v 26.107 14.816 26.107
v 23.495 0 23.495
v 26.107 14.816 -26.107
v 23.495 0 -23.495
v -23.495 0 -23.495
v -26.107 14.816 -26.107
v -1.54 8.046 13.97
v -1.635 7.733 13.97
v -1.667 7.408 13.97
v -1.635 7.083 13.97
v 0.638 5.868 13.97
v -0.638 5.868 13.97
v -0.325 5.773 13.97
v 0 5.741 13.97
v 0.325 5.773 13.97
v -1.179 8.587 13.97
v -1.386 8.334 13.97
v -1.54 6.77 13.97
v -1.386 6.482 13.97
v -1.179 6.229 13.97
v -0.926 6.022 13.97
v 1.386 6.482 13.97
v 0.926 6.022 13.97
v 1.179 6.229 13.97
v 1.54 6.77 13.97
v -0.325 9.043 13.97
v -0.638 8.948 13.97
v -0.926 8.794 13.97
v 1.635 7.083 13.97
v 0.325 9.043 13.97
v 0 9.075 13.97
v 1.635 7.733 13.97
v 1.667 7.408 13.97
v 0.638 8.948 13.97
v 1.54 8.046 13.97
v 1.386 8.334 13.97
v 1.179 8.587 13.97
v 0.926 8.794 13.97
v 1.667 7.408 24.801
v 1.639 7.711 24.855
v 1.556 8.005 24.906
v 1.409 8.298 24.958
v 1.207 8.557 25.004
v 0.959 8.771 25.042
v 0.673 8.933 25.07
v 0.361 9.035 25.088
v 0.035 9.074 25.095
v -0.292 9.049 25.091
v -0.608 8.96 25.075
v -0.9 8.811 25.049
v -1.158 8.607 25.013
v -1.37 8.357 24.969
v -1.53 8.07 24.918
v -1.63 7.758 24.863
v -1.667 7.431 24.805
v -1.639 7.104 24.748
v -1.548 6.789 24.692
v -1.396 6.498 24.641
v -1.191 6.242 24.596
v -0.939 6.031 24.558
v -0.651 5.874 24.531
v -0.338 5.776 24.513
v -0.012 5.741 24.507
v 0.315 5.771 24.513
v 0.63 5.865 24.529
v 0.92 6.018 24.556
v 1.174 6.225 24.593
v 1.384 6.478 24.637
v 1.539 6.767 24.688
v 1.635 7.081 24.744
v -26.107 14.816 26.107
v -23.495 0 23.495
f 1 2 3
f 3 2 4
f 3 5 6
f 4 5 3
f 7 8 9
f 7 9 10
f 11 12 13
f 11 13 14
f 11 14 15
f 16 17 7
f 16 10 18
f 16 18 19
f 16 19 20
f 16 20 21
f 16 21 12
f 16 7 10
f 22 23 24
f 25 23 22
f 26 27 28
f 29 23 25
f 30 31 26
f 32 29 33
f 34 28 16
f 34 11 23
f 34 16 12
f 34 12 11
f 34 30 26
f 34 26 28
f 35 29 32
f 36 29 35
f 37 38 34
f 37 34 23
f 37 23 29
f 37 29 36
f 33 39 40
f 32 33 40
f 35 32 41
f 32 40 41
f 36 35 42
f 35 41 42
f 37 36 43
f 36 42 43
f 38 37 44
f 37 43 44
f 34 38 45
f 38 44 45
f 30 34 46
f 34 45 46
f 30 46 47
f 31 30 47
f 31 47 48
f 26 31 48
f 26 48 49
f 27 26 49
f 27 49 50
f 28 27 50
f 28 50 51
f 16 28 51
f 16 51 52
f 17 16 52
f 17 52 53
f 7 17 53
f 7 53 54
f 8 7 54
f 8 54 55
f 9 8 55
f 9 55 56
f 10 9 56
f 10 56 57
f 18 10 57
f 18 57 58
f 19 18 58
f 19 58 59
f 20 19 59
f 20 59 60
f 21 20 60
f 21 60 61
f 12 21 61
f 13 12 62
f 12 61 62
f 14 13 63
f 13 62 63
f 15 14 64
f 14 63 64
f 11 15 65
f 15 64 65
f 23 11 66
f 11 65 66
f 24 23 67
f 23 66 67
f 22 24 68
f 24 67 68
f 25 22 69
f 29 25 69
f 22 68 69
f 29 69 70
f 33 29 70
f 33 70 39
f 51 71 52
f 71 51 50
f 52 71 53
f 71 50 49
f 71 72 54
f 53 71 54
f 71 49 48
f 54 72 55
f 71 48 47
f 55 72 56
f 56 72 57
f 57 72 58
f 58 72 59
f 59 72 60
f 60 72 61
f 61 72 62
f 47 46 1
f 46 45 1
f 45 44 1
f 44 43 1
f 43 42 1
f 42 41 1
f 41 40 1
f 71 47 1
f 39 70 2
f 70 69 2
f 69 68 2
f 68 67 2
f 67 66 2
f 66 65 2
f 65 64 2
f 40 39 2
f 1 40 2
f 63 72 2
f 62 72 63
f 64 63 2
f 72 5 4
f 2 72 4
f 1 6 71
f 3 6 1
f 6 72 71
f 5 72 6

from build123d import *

# Parameters (mm, degrees)
ESQUISSE1_W             = 46.99
ESQUISSE1_H             = 46.99
BOSS_EXTRU_1_DEPTH      = 14.81582
BOSS_EXTRU_1_DRAFT      = -10
ESQUISSE4_R             = 1.666875
ENL_V_MAT_EXTRU_1_DEPTH = 12.7


with BuildPart() as part:
    # Esquisse1 → Boss.-Extru.1 (with draft: the straight prism first)
    with BuildSketch(Plane(origin=(0, 0, 0), x_dir=(1, 0, 0), z_dir=(0, 1, 0))):
        Rectangle(ESQUISSE1_W, ESQUISSE1_H)
    extrude(amount=BOSS_EXTRU_1_DEPTH)
    # Boss.-Extru.1: the draft: its side faces are tilted about the plane it starts from
    boss_extru_1_sides = [part.faces().sort_by_distance(p)[0] for p in [
        (0, 7.40791, 23.495),
        (23.495, 7.40791, 0),
        (0, 7.40791, -23.495),
        (-23.495, 7.40791, 0),
    ]]
    draft(boss_extru_1_sides, Plane(origin=(0, 0, 0), x_dir=(1, 0, 0), z_dir=(0, 1, 0)), BOSS_EXTRU_1_DRAFT)

    # Esquisse4 → Enlèv. mat.-Extru.1 (cut)
    with BuildSketch(Plane.XY.offset(26.67)):
        with Locations((0, 7.40791)):
            Circle(ESQUISSE4_R)
    extrude(amount=-ENL_V_MAT_EXTRU_1_DEPTH, mode=Mode.SUBTRACT)


solid = part.part
